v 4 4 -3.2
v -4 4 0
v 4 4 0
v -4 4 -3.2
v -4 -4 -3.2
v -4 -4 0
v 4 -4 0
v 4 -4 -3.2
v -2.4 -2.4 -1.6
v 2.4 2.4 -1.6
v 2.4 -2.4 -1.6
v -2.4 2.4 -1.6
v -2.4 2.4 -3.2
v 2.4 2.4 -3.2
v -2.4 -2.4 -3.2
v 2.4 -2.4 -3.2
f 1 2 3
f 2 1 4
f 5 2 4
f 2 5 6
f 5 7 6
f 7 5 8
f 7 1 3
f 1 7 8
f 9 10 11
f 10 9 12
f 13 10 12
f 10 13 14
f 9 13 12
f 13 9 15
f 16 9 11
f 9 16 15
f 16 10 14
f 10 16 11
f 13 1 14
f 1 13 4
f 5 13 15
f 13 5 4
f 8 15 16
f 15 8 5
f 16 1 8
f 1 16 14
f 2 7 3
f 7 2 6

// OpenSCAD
// file: ../p/box5.scad
use <../lib.scad>
function ldraw_lib__box5() = [
// 0 Box with 5 Faces and All Edges
// 0 Name: box5.dat
// 0 Author: James Jessiman
// 0 !LDRAW_ORG Primitive UPDATE 2012-01
// 0 !LICENSE Licensed under CC BY 4.0 : see CAreadme.txt
// 
// 0 BFC CERTIFY CCW
  [0,"BFC","CERTIFY"],
  [0,"BFC","CCW"],
// 
// 0 !HISTORY 2002-04-03 [sbliss] Modified for BFC compliance
// 0 !HISTORY 2002-04-25 [PTadmin] Official Update 2002-02
// 0 !HISTORY 2007-06-24 [PTadmin] Header formatted for Contributor Agreement
// 0 !HISTORY 2008-07-01 [PTadmin] Official Update 2008-01
// 0 !HISTORY 2012-02-16 [Philo] Changed to CCW
// 0 !HISTORY 2012-03-30 [PTadmin] Official Update 2012-01
// 
// 
// 2 24 1 1 1 -1 1 1
  [2,24,1,1,1,-1,1,1],
// 2 24 -1 1 1 -1 1 -1
  [2,24,-1,1,1,-1,1,-1],
// 2 24 -1 1 -1 1 1 -1
  [2,24,-1,1,-1,1,1,-1],
// 2 24 1 1 -1 1 1 1
  [2,24,1,1,-1,1,1,1],
// 2 24 1 0 1 -1 0 1
  [2,24,1,0,1,-1,0,1],
// 2 24 -1 0 1 -1 0 -1
  [2,24,-1,0,1,-1,0,-1],
// 2 24 -1 0 -1 1 0 -1
  [2,24,-1,0,-1,1,0,-1],
// 2 24 1 0 -1 1 0 1
  [2,24,1,0,-1,1,0,1],
// 2 24 1 0 1 1 1 1
  [2,24,1,0,1,1,1,1],
// 2 24 -1 0 1 -1 1 1
  [2,24,-1,0,1,-1,1,1],
// 2 24 1 0 -1 1 1 -1
  [2,24,1,0,-1,1,1,-1],
// 2 24 -1 0 -1 -1 1 -1
  [2,24,-1,0,-1,-1,1,-1],
// 4 16 -1 1 1 1 1 1 1 1 -1 -1 1 -1
  [4,16,-1,1,1,1,1,1,1,1,-1,-1,1,-1],
// 4 16 -1 1 1 -1 0 1 1 0 1 1 1 1
  [4,16,-1,1,1,-1,0,1,1,0,1,1,1,1],
// 4 16 -1 1 -1 -1 0 -1 -1 0 1 -1 1 1
  [4,16,-1,1,-1,-1,0,-1,-1,0,1,-1,1,1],
// 4 16 1 1 -1 1 0 -1 -1 0 -1 -1 1 -1
  [4,16,1,1,-1,1,0,-1,-1,0,-1,-1,1,-1],
// 4 16 1 1 1 1 0 1 1 0 -1 1 1 -1
  [4,16,1,1,1,1,0,1,1,0,-1,1,1,-1],
];
module ldraw_lib__box5(step=0, col=false, unit=2/5, alt=false, line=0.2, solid=!$preview)
    makepoly(ldraw_lib__box5(), step=step, col=col, unit=unit, alt=alt, line=line, solid=solid);
ldraw_lib__box5(line=0.2);
// file: ../p/box4.scad
use <../lib.scad>
function ldraw_lib__box4() = [
// 0 Box with 4 Faces (2 Parallel Pairs) and All Edges
// 0 Name: box4.dat
// 0 Author: James Jessiman
// 0 !LDRAW_ORG Primitive UPDATE 2012-01
// 0 !LICENSE Licensed under CC BY 4.0 : see CAreadme.txt
// 
// 0 BFC CERTIFY CCW
  [0,"BFC","CERTIFY"],
  [0,"BFC","CCW"],
// 
// 0 !HISTORY 2002-04-03 [sbliss] Modified for BFC compliance
// 0 !HISTORY 2002-04-25 [PTadmin] Official Update 2002-02
// 0 !HISTORY 2007-06-24 [PTadmin] Header formatted for Contributor Agreement
// 0 !HISTORY 2008-07-01 [PTadmin] Official Update 2008-01
// 0 !HISTORY 2012-02-16 [Philo] Changed to CCW
// 0 !HISTORY 2012-03-30 [PTadmin] Official Update 2012-01
// 
// 
// 2 24 1 1 1 -1 1 1
  [2,24,1,1,1,-1,1,1],
// 2 24 -1 1 1 -1 1 -1
  [2,24,-1,1,1,-1,1,-1],
// 2 24 -1 1 -1 1 1 -1
  [2,24,-1,1,-1,1,1,-1],
// 2 24 1 1 -1 1 1 1
  [2,24,1,1,-1,1,1,1],
// 2 24 1 0 1 -1 0 1
  [2,24,1,0,1,-1,0,1],
// 2 24 -1 0 1 -1 0 -1
  [2,24,-1,0,1,-1,0,-1],
// 2 24 -1 0 -1 1 0 -1
  [2,24,-1,0,-1,1,0,-1],
// 2 24 1 0 -1 1 0 1
  [2,24,1,0,-1,1,0,1],
// 2 24 1 0 1 1 1 1
  [2,24,1,0,1,1,1,1],
// 2 24 -1 0 1 -1 1 1
  [2,24,-1,0,1,-1,1,1],
// 2 24 1 0 -1 1 1 -1
  [2,24,1,0,-1,1,1,-1],
// 2 24 -1 0 -1 -1 1 -1
  [2,24,-1,0,-1,-1,1,-1],
// 4 16 -1 1 1 -1 0 1 1 0 1 1 1 1
  [4,16,-1,1,1,-1,0,1,1,0,1,1,1,1],
// 4 16 -1 1 -1 -1 0 -1 -1 0 1 -1 1 1
  [4,16,-1,1,-1,-1,0,-1,-1,0,1,-1,1,1],
// 4 16 1 1 -1 1 0 -1 -1 0 -1 -1 1 -1
  [4,16,1,1,-1,1,0,-1,-1,0,-1,-1,1,-1],
// 4 16 1 1 1 1 0 1 1 0 -1 1 1 -1
  [4,16,1,1,1,1,0,1,1,0,-1,1,1,-1],
];
module ldraw_lib__box4(step=0, col=false, unit=2/5, alt=false, line=0.2, solid=!$preview)
    makepoly(ldraw_lib__box4(), step=step, col=col, unit=unit, alt=alt, line=line, solid=solid);
ldraw_lib__box4(line=0.2);
// main file
use <../lib.scad>
use <../p/box4.scad>
use <../p/box5.scad>
function ldraw_lib__3070a() = [
// 0 Tile  1 x  1 without Groove
// 0 Name: 3070a.dat
// 0 Author: James Jessiman
// 0 !LDRAW_ORG Part UPDATE 2003-03
// 0 !LICENSE Licensed under CC BY 4.0 : see CAreadme.txt
// 
// 0 BFC CERTIFY CW
  [0,"BFC","CERTIFY"],
  [0,"BFC","CW"],
// 
// 0 !HISTORY 2003-07-01 [Steffen] BFCed
// 0 !HISTORY 2003-12-19 [PTadmin] Official Update 2003-03
// 0 !HISTORY 2007-10-13 [PTadmin] Header formatted for Contributor Agreement
// 0 !HISTORY 2008-07-01 [PTadmin] Official Update 2008-01
// 
// 
// 1 16 0 8 0 10 0 0 0 -8 0 0 0 10 box4.dat
  [1,16,0,8,0,10,0,0,0,-8,0,0,0,10, ldraw_lib__box4()],
// 0 BFC INVERTNEXT
  [0,"BFC","INVERTNEXT"],
// 1 16 0 8 0 6 0 0 0 -4 0 0 0 6 box5.dat
  [1,16,0,8,0,6,0,0,0,-4,0,0,0,6, ldraw_lib__box5()],
// 4 16 -10 8 10 -6 8 6 6 8 6 10 8 10
  [4,16,-10,8,10,-6,8,6,6,8,6,10,8,10],
// 4 16 -10 8 -10 -6 8 -6 -6 8 6 -10 8 10
  [4,16,-10,8,-10,-6,8,-6,-6,8,6,-10,8,10],
// 4 16 10 8 -10 6 8 -6 -6 8 -6 -10 8 -10
  [4,16,10,8,-10,6,8,-6,-6,8,-6,-10,8,-10],
// 4 16 10 8 10 6 8 6 6 8 -6 10 8 -10
  [4,16,10,8,10,6,8,6,6,8,-6,10,8,-10],
// 4 16 -10 0 10 10 0 10 10 0 -10 -10 0 -10
  [4,16,-10,0,10,10,0,10,10,0,-10,-10,0,-10],
// 0
];
module ldraw_lib__3070a(step=0, col=false, unit=2/5, alt=false, line=0.2, solid=!$preview)
    makepoly(ldraw_lib__3070a(), step=step, col=col, unit=unit, alt=alt, line=line, solid=solid);
ldraw_lib__3070a(line=0.2);
